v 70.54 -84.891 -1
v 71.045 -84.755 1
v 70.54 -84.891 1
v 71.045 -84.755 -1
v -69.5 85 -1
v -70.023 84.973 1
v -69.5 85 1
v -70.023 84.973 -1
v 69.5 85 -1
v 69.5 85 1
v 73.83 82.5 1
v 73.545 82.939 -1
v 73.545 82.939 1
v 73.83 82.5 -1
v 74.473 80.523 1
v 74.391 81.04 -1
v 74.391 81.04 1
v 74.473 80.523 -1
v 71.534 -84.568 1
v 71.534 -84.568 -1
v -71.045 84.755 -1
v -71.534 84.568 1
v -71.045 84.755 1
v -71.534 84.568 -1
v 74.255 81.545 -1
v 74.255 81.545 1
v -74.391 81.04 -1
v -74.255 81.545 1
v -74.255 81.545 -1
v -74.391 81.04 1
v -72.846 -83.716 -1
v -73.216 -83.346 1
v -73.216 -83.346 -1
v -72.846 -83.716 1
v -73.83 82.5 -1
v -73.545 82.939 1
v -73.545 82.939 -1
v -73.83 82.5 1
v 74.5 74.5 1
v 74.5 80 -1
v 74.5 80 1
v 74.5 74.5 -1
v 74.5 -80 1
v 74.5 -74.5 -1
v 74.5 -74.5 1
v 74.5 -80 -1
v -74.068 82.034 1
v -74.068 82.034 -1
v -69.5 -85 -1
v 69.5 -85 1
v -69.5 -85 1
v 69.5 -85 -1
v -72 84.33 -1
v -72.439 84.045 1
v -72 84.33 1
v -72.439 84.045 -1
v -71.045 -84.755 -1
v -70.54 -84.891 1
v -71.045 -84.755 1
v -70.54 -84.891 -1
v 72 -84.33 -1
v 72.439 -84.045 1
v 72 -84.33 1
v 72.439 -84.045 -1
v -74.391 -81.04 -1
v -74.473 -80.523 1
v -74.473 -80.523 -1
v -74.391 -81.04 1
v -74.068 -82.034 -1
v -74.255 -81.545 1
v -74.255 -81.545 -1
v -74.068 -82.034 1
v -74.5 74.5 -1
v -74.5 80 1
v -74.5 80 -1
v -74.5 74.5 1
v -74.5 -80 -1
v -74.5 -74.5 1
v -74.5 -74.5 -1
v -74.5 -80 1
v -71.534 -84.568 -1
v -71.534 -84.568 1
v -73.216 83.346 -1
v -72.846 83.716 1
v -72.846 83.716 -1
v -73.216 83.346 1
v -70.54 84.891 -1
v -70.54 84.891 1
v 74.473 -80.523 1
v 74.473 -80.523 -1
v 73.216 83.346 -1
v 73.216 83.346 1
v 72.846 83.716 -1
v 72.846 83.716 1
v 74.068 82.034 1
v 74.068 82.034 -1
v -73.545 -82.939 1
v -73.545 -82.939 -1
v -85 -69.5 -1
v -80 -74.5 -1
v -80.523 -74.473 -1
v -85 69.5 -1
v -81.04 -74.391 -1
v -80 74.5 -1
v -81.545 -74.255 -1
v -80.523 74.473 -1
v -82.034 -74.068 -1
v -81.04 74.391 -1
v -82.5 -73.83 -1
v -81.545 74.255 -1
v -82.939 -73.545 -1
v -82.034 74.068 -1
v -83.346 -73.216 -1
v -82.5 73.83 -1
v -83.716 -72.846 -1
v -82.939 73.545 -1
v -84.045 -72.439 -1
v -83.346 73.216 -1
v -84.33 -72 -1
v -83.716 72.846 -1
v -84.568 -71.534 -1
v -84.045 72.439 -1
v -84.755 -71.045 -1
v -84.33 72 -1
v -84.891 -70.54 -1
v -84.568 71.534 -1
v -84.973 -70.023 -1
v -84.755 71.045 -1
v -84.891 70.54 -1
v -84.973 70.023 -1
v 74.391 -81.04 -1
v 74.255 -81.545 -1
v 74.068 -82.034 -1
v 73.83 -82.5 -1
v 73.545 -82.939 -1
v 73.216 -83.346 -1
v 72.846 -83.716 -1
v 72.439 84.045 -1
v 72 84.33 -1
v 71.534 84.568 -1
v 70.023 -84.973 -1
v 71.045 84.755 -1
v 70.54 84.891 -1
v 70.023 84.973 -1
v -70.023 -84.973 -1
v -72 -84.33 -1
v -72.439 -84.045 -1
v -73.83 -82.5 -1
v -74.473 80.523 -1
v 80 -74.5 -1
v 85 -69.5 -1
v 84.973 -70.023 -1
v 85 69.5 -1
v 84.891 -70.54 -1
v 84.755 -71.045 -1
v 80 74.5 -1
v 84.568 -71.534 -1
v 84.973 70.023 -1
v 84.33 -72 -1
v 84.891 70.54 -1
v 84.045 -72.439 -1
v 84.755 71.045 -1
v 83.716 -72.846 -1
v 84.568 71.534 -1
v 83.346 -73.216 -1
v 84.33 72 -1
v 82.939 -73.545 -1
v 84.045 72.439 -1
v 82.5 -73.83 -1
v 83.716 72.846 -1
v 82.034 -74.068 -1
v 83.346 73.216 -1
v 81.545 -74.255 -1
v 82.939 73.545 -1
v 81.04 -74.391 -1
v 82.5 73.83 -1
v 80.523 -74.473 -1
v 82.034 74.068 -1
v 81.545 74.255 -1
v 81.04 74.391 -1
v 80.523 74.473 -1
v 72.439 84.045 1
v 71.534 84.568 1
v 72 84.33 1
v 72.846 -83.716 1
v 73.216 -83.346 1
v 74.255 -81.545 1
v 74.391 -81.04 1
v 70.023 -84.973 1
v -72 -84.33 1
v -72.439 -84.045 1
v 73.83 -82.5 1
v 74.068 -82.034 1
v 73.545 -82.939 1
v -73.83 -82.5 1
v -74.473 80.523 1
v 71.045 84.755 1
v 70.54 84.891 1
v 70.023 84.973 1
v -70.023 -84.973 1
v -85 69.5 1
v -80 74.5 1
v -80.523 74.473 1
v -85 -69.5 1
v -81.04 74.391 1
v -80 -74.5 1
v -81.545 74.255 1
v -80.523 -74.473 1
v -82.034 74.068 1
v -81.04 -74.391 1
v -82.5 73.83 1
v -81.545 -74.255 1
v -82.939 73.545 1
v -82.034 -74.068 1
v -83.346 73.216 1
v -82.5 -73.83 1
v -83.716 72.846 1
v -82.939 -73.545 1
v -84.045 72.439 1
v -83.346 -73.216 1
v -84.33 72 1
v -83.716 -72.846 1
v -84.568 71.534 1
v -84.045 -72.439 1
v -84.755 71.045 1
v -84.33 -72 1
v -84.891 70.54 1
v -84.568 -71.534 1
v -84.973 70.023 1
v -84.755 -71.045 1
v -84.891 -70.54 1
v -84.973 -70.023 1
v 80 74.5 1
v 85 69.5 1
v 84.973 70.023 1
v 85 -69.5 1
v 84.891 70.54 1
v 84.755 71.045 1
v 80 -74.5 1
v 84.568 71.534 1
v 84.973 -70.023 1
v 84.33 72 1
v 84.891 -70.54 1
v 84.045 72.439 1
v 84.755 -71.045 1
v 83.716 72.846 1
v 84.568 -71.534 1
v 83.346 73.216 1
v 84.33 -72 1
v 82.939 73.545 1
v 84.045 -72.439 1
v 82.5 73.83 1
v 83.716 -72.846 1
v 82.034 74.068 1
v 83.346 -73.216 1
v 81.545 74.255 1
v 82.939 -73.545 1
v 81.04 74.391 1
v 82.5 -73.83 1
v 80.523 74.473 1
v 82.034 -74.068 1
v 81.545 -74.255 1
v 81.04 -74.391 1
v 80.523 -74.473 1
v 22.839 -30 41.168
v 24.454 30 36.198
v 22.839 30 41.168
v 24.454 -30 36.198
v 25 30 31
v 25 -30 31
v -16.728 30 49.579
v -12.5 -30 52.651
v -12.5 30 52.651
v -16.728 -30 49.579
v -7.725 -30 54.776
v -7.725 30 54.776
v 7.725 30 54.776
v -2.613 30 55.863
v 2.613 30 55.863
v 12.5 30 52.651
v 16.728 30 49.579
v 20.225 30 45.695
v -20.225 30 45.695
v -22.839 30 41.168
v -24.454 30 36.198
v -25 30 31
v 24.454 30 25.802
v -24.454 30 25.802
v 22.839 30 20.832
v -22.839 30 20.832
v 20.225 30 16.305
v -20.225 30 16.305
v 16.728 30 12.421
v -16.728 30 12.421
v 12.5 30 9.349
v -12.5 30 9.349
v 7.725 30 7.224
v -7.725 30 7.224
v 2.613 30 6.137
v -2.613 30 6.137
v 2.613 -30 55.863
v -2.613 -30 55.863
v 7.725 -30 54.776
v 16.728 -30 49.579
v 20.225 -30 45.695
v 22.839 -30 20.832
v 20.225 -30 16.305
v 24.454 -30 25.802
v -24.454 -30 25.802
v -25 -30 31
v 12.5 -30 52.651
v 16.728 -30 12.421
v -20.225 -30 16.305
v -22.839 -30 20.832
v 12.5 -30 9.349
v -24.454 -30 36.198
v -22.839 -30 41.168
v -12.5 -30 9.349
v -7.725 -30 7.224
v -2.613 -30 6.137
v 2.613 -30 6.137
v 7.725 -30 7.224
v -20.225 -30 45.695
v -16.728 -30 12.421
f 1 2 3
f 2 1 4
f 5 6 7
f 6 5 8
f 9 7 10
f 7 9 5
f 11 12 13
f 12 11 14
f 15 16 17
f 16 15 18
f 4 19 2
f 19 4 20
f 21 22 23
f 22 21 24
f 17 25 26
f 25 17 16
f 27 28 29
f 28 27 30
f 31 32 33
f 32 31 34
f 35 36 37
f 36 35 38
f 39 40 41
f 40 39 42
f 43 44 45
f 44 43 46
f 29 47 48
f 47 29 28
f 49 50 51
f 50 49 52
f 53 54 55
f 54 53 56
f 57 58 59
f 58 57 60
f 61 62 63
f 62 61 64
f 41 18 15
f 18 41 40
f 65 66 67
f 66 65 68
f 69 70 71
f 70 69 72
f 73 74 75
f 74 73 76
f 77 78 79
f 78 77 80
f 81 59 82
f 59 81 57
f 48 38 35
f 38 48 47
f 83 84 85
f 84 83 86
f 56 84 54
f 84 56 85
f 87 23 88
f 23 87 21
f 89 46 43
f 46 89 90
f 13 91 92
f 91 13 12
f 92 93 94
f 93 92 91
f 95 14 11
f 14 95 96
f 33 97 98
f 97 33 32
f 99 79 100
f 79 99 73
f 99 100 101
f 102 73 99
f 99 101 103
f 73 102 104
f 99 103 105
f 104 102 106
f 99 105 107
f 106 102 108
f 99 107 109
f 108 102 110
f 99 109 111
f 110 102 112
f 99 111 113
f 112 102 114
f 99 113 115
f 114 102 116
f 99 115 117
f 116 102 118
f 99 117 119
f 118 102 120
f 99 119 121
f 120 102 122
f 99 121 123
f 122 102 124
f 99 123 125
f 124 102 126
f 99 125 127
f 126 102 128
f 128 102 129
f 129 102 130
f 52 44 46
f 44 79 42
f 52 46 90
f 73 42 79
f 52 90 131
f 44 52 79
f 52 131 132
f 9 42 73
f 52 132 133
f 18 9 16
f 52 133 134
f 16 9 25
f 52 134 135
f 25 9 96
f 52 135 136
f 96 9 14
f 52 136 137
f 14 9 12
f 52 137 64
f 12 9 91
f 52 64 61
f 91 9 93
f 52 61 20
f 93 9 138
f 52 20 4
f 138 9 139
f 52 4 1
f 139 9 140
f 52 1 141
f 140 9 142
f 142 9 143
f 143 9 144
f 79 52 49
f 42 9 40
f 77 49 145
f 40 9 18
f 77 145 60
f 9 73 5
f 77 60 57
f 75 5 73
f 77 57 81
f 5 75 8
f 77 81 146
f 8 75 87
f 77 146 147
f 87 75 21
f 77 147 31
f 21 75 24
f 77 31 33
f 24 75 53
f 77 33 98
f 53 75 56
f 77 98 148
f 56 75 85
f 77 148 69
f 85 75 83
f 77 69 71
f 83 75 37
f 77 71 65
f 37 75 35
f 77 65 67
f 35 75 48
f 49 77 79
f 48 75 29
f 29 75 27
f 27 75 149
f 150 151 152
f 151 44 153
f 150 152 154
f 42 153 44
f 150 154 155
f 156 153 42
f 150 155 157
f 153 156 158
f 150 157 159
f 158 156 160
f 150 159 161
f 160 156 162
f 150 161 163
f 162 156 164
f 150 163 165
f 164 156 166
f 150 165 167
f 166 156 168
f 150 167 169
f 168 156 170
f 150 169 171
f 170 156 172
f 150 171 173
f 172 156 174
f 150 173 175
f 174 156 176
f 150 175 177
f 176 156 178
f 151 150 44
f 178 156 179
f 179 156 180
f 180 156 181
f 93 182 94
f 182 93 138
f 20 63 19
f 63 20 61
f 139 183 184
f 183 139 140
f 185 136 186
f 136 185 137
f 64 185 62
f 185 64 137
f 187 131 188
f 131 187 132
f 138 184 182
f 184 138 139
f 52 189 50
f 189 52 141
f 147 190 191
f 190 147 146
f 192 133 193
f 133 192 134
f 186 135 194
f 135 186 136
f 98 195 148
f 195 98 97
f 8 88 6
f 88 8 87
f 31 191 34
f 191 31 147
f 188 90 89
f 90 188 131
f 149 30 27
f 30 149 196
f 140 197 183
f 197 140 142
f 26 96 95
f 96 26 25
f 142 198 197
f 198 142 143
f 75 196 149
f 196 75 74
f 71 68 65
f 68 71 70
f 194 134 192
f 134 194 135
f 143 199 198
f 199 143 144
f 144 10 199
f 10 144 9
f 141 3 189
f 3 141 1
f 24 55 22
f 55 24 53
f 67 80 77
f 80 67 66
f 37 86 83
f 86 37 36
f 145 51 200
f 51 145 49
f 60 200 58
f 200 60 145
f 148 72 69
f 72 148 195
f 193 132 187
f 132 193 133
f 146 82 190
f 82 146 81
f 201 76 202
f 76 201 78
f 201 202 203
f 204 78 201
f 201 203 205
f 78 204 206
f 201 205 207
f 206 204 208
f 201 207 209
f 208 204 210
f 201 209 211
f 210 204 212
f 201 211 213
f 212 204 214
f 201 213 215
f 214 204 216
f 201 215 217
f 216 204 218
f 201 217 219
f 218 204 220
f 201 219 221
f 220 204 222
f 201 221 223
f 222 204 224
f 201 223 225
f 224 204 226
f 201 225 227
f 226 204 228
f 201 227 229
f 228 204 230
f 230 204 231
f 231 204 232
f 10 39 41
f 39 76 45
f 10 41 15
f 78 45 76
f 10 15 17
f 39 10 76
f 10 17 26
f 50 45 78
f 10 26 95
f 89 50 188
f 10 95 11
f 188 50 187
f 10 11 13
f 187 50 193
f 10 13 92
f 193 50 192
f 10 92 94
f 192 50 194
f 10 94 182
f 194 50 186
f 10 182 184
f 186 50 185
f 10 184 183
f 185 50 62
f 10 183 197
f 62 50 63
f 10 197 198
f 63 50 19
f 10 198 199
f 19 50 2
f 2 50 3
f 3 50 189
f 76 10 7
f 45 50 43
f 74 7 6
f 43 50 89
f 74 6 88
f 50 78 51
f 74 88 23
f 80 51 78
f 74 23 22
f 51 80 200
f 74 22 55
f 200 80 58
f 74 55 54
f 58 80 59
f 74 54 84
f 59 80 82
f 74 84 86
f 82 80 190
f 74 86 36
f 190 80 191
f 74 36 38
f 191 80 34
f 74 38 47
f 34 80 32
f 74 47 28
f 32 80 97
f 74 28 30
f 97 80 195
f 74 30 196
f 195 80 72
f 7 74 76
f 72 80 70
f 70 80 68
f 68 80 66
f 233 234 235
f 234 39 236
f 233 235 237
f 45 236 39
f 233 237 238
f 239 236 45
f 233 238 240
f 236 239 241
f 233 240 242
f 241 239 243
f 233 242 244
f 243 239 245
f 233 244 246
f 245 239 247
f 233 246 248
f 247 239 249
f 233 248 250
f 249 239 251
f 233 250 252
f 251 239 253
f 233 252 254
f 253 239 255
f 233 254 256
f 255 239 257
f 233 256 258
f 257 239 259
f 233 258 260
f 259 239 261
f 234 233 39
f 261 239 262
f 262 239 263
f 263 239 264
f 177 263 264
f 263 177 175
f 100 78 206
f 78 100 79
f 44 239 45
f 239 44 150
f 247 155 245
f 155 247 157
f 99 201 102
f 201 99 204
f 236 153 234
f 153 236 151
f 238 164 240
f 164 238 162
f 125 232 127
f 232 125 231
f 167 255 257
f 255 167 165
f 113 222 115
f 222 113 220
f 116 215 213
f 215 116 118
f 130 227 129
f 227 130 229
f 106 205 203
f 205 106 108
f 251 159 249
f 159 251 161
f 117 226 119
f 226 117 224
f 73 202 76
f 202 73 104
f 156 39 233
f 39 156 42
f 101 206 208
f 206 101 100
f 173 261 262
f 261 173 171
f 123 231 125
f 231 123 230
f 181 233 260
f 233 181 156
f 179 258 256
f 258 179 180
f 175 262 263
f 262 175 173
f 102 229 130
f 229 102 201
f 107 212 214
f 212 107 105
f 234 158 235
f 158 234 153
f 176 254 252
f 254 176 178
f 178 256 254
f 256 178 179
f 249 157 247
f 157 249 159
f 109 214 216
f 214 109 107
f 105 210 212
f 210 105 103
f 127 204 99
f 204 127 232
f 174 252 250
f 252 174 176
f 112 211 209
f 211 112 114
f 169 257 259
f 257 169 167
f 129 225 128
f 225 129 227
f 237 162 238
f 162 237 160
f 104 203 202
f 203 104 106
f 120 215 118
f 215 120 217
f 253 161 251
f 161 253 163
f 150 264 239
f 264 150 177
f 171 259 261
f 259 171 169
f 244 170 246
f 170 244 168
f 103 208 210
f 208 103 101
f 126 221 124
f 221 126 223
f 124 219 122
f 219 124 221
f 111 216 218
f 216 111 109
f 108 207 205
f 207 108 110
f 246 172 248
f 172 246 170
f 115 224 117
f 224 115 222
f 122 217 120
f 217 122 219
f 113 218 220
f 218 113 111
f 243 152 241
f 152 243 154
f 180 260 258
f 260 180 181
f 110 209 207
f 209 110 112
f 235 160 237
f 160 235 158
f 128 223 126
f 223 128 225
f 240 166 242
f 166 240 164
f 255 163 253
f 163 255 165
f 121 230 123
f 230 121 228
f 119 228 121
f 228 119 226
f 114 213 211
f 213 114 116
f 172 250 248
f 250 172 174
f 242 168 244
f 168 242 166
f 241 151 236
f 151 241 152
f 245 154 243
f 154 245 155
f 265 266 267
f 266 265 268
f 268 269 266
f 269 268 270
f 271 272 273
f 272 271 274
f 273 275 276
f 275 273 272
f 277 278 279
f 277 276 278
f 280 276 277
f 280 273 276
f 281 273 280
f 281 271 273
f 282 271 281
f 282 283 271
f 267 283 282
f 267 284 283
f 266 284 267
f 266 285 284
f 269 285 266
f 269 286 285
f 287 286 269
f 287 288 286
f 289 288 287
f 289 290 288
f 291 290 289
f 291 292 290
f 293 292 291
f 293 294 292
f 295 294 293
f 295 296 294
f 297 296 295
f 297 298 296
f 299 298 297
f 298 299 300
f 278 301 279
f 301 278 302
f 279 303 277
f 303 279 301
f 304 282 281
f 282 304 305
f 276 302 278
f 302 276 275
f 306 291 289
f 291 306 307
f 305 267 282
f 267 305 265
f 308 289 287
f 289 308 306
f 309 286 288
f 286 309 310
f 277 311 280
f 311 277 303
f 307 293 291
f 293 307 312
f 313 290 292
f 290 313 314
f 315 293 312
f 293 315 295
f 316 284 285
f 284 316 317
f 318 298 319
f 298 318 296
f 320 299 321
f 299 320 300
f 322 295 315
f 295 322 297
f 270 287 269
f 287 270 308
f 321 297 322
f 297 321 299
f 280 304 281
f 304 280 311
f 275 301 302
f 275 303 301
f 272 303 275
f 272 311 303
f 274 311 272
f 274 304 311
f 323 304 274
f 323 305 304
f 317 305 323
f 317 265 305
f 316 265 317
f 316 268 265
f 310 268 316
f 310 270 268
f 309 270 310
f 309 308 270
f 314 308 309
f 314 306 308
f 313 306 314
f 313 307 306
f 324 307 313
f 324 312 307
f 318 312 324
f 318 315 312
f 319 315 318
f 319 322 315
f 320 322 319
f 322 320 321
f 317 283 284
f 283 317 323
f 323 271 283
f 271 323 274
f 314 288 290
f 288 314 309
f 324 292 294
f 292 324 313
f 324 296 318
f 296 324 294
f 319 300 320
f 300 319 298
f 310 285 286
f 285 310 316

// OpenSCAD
// file: ../core/standoffs.scad
// ============== ETHOSCOPE CHILD MODULES ============= //



// module standoff_single(bolt_diam, standoff_height, wall_thick){
//     bolt_diam = bolt_diam + 0.15; // Here's changing the camera bolt size
//     $fn=30;
//     difference(){
//         hull(){
//             translate([0,0,standoff_height-0.2]) cylinder(d=bolt_diam+wall_thick, h=0.1);
//             cylinder(d=(bolt_diam+wall_thick)*standoff_height/4, h=0.1);
//         }
//         cylinder(d=bolt_diam, h=standoff_height); 
//     }
// }


// module standoff_quad(standoff_dims, bolt_diam, wall_thick){
//     for (i=[-1,1]){
//         translate([standoff_dims[0]/2,i*standoff_dims[1]/2,0])
//         standoff_single(bolt_diam, standoff_dims[2], wall_thick);
//     }
//     mirror([1,0,0])
//     for (i=[-1,1]){
//         translate([standoff_dims[0]/2,i*standoff_dims[1]/2,0])
//         standoff_single(bolt_diam, standoff_dims[2], wall_thick);
//     }
// }
// file: ../core/rounded_cube.scad
module rounded_cube(
    dims, 
    radius=1, 
    outside=false, 
    $fn=60
) {

    new_dims = dims / 2;
    if (outside==true){
        new_dims = [new_dims[0] - radius, new_dims[1] - radius, new_dims[2]];
        points = [  [new_dims[0],-new_dims[1],0], 
                [new_dims[0],new_dims[1],0], 
                [-new_dims[0],new_dims[1],0], 
                [-new_dims[0],-new_dims[1],0] ];
        translate([0,0,-dims[2]/2])
        hull(){
            for (p = points){
                translate(p) cylinder(r=radius, h=dims[2]);
            }
        }
    } else {
        points = [  [new_dims[0],-new_dims[1],0], 
                [new_dims[0],new_dims[1],0], 
                [-new_dims[0],new_dims[1],0], 
                [-new_dims[0],-new_dims[1],0] ];
        translate([0,0,-dims[2]/2])
        hull(){
            for (p = points){
                translate(p) cylinder(r=radius, h=dims[2]);
            }
        }
    }
}
// file: ../core/o_ring.scad
// === Module: O-ring === //
module o_ring(outer_diam, ring_diam) {
    outer_diam = outer_diam + 1;
    rotate([0,0,0])
    rotate_extrude(angle=360) {
        translate([(outer_diam-ring_diam/2)/2, 0])
        circle(d=ring_diam); 
        } // rotate_extrude
    cylinder(d=outer_diam-ring_diam/2, h=ring_diam, center=true);
}
// file: ../core/makerbeam.scad
module makerbeam_end(
    bolt_diam, 
    makerbeam, 
    length=10
) {
    
    // The last part of a MakerBeam along with a a flatheaded bolt for mounting
    
    translate([0,0,length/2+(2/3)*bolt_diam]) 
    rotate([0,90,0]){   // Bring things up to level
        cube([length, makerbeam, makerbeam], center=true);   // MakerBeam
        translate([length/2+(2/3)*bolt_diam,0,0]) rotate([0,-90,0]){
            cylinder(h=length, d=bolt_diam);    // Bolt
            hull(){     // Bolt head
                translate([0,0,(2/3)*bolt_diam]) cylinder(h=0.1, d=bolt_diam);
                cylinder(h=0.2, d=bolt_diam*2);
            }
        }
    }
}
// file: ../core/magnets.scad
function magnet_size_correct(magnet_size) 
    = [ magnet_size[0]+0.4, magnet_size[1]+0.2 ];

module magnets(dims, magnet_size, wall_thick){
    magnet_size_corrected = magnet_size_correct(magnet_size);
    
    for (i = [-1,1]){
        for (j = [0,1]){
            translate([i*dims[0]/2,0,0]){
                mirror([j,0,0])
                cylinder(d=magnet_size_corrected[0], h=magnet_size_corrected[1]);
            }
        }
    }
    // for (i=[-1,1]) {
    //     translate([dims[0]/2,i*dims[1]/2,-(magnet_size_corrected[1])])
    //     cylinder(d=magnet_size_corrected[0], h=magnet_size_corrected[1]);
    // }
}
// file: ../core/functions.scad
function add(vector, k) = [ for (vector=vector) vector+k ];
    
function get_points(distances) // A vector of 2
    = [ [-distances[0]/2,-distances[1]/2],
        [distances[0]/2,-distances[1]/2],
        [-distances[0]/2,distances[1]/2],
        [distances[0]/2,distances[1]/2]
    ];

function selector(item, dict) = dict[search([item], dict)[0]];
// file: ../core/cross.scad
module cross(dims, outer_length, magnet_size=[0,0], wall_thick){
    for (i=[-1,1]) {
        hull(){
            translate([dims[0]/2,i*dims[1]/2,0]) 
            cylinder(h=magnet_size[1]+wall_thick, d=outer_length, center=true);
            
            translate([-dims[0]/2,-i*dims[1]/2,0]) 
            cylinder(h=magnet_size[1]+wall_thick, d=outer_length, center=true);
        }
    }
}
// file: ../core/corners.scad
use <rounded_cube.scad>;

module corners(dims, outer_length){
    for (i=[-1,1]) {
        translate([dims[0]/2,i*dims[1]/2,0])
        rounded_cube([outer_length,outer_length,dims[2]],2);
    }
}

module corners_hollow(dims, makerbeam, bolt_diam){
    for (i=[-1,1]) {
        translate([dims[0]/2,i*dims[1]/2,-dims[2]/2])
        makerbeam_end(bolt_diam=bolt_diam, makerbeam=makerbeam, length=dims[2]);
    } 
}
// file: ../core/core.scad
// 

include <corners.scad>;
include <cross.scad>;
include <functions.scad>;
include <magnets.scad>;
include <makerbeam.scad>;
include <o_ring.scad>;
include <rounded_cube.scad>;
include <standoffs.scad>;
// file: arena_empty.scad
use <../core/core.scad>;

module arena_empty(
    dims, 
    magnet_dims,
    magnet_size,
    makerbeam,
    corner_height,
    top_magnets=false,
) {
        
    magnet_dims = [magnet_dims[0], magnet_dims[1], corner_height];
    
    
    dimsA = [dims[0]-makerbeam-1, dims[1]+makerbeam, dims[2]];
    dimsB = [dims[0]+makerbeam, dims[1]-makerbeam-1, dims[2]];
    echo(magnet_dims[2]);
    difference(){
        union(){
            
            // Plate base + magnet holders
            rounded_cube(dimsA, makerbeam/2, true);
            rounded_cube(dimsB, makerbeam/2, true);
            translate([0,0,magnet_dims[2]/2-dims[2]/2]){
            //     corners(magnet_dims, makerbeam); // Corners
            //     mirror([1,0,0]) corners(magnet_dims, makerbeam); // Corners
            }
        }
               
        // Bottom magnets
        translate([0,0,magnet_size[1]/2]){
            magnets([magnet_dims[0], magnet_dims[1], magnet_size[1]+2], magnet_size, 3);
            mirror([1,0,0]) magnets([magnet_dims[0], magnet_dims[1], magnet_size[1]+2], magnet_size, 3);
        }
        if (top_magnets == true){
            // Bottom magnets
            translate([0,0,corner_height-dims[2]/2]){
                magnets(magnet_dims, magnet_size, 3);
                mirror([1,0,0]) magnets(magnet_dims, magnet_size, 3);
        }
    }
  }
}

module wall(
    dims, 
    wall_thick, 
    with_floor=false, 
    with_led=false,
    floor_thick=2
){
    extra = 1;
    inner_dims = dims + [-2*wall_thick,-2*wall_thick,1];
    dims_negative = dims + [1,1,0];
    hole_width = 5;
    n_holes = [floor((dims[0]) / (hole_width*2)),
               floor((dims[1]) / (hole_width*2))];

    difference(){
        rounded_cube(dims, 2);
        if (with_floor==true){
            translate([0,0,floor_thick])
            rounded_cube(inner_dims, 2);
            translate([0,0,dims[2]-10])
            rounded_cube(dims_negative, 2);
        } else {
            rounded_cube(inner_dims, 2);
        }
        if (with_led==true){
            translate([0,0,-dims[2]/4])
            for (i=[-1,1]){
                for (j=[0,1]){
                    rotate([0,0,j*90])
                    translate([i*(dims[0]-1.5*wall_thick)/2,0,0]){
                        cube([wall_thick,dims[1]-20,14], center=true);
                        translate([0,i*(dims[1]-50)/2,4])
                        cube([wall_thick*2,9,19], center=true);
                    }
                }
            }
        }
    }
}
// main file
use <arena_empty.scad>;
use <../core/core.scad>;

$fn = 30;

/* [General:] */
// combo box for number
wall_thick = 3;
primary_bolt = 3;
secondary_bolt = 2;
makerbeam = 10;
magnet_size = [6.2,3]; // diameter, height
wellplate_dims = [127.63,85.47,2]; 
target_diam = 7;

// Dimensions
dims = [160,160,15]; //normal length
magnet_dims = [dims[0]-25,dims[1],magnet_size[1]*2+wall_thick];
light_chamber_dims = [dims[0],dims[1],50];
arena_dims = [dims[0],dims[1],2];

// [diameter, height, gap width]
chamber_dims = [40,60]; // [
beam_height = 300;

// Camera specs
cam_dims = [40, 40]; // USB: [40,40] - RPi: [30, 25]
lens_diam = 25; // lens hole diameter
standoff_dims = [34,34,10]; // USB: [34,34,10] - RPi: [21,13.5,6];

arena_metabolic_chamber_vertical(
    arena_dims, 
    magnet_dims, 
    chamber_dims,
    magnet_size, 
    makerbeam
);

module arena_metabolic_chamber_vertical(
    dims, 
    magnet_dims, 
    chamber_dims,
    magnet_size, 
    makerbeam,
) {
    chamber_d = chamber_dims[0]+2;
    chamber_h = chamber_dims[1];
    wall_thickness = 4;
    rubber_r = 1;
    
    union(){
        // Arena base
        arena_empty(
            dims = dims, 
            magnet_dims = magnet_dims,
            magnet_size = magnet_size, 
            makerbeam = makerbeam
        );
        
        // Translate other stuff on top
        translate([0,0,(chamber_dims[1]+dims[2])/2]){
            // Other stuff
            difference(){
                rotate([90,0,0])
                cylinder(d=chamber_d+2*wall_thickness, h=chamber_h, center=true);
            }
        }
    }
        
}
